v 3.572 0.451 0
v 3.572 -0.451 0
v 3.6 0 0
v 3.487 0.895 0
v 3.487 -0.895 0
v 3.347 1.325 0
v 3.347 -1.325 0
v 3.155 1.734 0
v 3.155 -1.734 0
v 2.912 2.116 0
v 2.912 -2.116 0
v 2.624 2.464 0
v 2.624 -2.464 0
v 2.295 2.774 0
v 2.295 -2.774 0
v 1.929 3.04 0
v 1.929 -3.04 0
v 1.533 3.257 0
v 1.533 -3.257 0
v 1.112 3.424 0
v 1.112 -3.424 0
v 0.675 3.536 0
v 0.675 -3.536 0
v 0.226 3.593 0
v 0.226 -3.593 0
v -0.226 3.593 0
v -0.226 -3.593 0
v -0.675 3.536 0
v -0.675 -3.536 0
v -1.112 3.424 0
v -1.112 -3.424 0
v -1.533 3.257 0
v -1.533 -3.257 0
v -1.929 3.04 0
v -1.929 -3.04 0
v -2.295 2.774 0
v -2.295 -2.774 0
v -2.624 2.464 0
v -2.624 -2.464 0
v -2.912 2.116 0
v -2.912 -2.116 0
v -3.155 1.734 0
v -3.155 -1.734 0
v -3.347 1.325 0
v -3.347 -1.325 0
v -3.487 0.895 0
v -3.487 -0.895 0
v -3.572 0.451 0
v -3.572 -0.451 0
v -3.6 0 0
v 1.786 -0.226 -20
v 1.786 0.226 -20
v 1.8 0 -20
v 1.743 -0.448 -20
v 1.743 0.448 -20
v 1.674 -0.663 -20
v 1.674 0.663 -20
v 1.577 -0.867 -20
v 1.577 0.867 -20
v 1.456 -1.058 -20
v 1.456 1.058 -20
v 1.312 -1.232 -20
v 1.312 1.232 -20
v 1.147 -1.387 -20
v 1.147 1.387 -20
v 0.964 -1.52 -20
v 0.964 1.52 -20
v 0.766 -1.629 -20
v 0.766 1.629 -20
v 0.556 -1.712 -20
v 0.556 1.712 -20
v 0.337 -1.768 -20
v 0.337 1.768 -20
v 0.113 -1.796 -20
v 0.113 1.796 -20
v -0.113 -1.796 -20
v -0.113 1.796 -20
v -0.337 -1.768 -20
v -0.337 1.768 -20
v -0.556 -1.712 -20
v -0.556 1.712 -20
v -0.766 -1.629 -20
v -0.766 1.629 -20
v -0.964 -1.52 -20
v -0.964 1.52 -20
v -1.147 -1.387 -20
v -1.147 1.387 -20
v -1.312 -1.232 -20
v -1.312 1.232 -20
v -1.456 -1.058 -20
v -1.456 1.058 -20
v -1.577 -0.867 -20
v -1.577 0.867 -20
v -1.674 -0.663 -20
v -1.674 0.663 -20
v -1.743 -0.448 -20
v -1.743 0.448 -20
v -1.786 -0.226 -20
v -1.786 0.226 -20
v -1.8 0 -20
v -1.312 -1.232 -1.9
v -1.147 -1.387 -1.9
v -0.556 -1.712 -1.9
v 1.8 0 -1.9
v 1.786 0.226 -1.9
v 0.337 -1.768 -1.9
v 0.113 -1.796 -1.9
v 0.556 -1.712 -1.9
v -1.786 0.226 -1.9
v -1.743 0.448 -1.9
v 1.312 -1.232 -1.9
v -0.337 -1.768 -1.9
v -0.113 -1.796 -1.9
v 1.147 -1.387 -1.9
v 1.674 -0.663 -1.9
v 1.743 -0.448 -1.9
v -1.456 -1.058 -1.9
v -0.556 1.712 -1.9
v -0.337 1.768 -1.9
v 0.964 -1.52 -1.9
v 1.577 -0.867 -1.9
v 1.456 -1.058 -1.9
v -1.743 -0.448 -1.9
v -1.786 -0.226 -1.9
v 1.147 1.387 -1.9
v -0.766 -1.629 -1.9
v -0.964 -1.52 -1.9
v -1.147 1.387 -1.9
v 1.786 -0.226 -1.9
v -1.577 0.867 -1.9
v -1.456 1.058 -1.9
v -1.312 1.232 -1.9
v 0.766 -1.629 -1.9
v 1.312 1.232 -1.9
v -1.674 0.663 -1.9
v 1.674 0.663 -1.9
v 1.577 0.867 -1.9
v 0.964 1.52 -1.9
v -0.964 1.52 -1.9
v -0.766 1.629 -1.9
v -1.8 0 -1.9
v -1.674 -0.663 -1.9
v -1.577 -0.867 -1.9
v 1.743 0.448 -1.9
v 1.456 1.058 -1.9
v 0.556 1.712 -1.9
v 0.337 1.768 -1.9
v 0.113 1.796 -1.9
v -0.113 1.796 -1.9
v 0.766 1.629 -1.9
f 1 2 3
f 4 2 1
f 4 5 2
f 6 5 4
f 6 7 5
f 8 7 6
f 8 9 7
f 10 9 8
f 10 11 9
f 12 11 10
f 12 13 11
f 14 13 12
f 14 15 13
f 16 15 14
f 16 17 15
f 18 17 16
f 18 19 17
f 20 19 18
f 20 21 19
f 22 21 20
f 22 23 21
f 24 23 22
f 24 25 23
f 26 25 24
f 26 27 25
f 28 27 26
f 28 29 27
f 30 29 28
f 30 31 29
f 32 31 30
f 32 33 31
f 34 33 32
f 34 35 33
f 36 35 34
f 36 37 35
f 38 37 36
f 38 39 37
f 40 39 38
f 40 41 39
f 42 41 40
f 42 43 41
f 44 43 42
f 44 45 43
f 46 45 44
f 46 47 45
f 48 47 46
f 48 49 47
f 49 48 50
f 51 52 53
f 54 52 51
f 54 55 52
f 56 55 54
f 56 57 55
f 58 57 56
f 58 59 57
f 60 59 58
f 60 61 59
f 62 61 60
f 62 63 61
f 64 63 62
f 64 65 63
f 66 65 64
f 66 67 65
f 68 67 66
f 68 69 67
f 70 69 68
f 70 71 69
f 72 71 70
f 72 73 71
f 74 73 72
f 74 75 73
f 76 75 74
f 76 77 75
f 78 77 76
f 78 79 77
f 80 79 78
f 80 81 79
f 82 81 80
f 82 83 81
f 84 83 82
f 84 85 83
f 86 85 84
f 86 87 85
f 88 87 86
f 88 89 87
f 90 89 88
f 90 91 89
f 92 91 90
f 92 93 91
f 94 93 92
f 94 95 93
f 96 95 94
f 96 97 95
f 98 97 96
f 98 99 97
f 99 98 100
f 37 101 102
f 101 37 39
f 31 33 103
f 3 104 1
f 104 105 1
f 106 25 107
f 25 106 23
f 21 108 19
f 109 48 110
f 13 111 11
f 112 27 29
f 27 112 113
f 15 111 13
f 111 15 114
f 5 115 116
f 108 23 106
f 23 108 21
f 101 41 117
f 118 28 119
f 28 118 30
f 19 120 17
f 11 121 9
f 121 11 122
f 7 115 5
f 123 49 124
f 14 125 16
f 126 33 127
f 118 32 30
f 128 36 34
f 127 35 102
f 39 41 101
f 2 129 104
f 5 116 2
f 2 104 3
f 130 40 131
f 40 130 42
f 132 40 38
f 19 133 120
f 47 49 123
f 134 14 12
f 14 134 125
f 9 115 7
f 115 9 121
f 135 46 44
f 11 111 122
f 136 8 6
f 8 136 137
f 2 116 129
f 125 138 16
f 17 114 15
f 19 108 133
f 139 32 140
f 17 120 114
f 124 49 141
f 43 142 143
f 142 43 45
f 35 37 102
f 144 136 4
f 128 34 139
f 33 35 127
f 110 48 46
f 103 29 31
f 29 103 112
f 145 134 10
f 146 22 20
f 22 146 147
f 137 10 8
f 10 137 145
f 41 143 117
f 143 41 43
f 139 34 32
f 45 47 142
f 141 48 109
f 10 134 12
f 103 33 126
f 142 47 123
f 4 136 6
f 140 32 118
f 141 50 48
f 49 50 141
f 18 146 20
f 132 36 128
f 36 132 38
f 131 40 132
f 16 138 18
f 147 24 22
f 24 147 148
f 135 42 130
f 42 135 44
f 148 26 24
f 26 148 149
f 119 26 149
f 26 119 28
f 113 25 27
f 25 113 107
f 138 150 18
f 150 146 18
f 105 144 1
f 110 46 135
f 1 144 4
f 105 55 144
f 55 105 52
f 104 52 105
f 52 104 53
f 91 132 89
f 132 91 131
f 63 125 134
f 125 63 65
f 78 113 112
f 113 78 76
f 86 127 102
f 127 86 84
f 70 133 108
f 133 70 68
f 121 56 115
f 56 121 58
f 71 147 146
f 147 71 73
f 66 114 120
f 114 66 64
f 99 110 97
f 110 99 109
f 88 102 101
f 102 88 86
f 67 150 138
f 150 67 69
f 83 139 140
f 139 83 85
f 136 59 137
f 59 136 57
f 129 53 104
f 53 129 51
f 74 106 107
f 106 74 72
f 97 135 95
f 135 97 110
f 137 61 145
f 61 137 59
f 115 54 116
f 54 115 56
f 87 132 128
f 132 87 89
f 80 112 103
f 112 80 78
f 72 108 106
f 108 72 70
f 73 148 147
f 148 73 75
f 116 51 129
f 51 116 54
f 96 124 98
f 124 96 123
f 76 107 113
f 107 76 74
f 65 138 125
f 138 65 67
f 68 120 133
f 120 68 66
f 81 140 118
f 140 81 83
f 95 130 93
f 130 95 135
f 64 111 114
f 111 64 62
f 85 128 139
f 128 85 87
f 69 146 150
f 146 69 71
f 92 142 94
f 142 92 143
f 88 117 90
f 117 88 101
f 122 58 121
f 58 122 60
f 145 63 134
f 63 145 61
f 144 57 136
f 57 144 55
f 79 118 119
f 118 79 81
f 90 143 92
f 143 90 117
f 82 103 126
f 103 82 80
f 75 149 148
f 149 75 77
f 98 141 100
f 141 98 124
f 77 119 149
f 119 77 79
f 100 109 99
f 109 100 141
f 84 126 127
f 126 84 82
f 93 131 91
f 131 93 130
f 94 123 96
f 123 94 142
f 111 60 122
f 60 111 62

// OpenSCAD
$fn = 50;


difference() {
	union() {
		translate(v = [0, 0, 0]) {
			rotate(a = [0, 0, 0]) {
				difference() {
					union() {
						translate(v = [0, 0, -20.0000000000]) {
							cylinder(h = 20, r = 1.5000000000);
						}
						translate(v = [0, 0, -1.9000000000]) {
							cylinder(h = 1.9000000000, r1 = 1.8000000000, r2 = 3.6000000000);
						}
						translate(v = [0, 0, -20.0000000000]) {
							cylinder(h = 20, r = 1.8000000000);
						}
						translate(v = [0, 0, -20.0000000000]) {
							cylinder(h = 20, r = 1.5000000000);
						}
					}
					union();
				}
			}
		}
	}
	union();
}
